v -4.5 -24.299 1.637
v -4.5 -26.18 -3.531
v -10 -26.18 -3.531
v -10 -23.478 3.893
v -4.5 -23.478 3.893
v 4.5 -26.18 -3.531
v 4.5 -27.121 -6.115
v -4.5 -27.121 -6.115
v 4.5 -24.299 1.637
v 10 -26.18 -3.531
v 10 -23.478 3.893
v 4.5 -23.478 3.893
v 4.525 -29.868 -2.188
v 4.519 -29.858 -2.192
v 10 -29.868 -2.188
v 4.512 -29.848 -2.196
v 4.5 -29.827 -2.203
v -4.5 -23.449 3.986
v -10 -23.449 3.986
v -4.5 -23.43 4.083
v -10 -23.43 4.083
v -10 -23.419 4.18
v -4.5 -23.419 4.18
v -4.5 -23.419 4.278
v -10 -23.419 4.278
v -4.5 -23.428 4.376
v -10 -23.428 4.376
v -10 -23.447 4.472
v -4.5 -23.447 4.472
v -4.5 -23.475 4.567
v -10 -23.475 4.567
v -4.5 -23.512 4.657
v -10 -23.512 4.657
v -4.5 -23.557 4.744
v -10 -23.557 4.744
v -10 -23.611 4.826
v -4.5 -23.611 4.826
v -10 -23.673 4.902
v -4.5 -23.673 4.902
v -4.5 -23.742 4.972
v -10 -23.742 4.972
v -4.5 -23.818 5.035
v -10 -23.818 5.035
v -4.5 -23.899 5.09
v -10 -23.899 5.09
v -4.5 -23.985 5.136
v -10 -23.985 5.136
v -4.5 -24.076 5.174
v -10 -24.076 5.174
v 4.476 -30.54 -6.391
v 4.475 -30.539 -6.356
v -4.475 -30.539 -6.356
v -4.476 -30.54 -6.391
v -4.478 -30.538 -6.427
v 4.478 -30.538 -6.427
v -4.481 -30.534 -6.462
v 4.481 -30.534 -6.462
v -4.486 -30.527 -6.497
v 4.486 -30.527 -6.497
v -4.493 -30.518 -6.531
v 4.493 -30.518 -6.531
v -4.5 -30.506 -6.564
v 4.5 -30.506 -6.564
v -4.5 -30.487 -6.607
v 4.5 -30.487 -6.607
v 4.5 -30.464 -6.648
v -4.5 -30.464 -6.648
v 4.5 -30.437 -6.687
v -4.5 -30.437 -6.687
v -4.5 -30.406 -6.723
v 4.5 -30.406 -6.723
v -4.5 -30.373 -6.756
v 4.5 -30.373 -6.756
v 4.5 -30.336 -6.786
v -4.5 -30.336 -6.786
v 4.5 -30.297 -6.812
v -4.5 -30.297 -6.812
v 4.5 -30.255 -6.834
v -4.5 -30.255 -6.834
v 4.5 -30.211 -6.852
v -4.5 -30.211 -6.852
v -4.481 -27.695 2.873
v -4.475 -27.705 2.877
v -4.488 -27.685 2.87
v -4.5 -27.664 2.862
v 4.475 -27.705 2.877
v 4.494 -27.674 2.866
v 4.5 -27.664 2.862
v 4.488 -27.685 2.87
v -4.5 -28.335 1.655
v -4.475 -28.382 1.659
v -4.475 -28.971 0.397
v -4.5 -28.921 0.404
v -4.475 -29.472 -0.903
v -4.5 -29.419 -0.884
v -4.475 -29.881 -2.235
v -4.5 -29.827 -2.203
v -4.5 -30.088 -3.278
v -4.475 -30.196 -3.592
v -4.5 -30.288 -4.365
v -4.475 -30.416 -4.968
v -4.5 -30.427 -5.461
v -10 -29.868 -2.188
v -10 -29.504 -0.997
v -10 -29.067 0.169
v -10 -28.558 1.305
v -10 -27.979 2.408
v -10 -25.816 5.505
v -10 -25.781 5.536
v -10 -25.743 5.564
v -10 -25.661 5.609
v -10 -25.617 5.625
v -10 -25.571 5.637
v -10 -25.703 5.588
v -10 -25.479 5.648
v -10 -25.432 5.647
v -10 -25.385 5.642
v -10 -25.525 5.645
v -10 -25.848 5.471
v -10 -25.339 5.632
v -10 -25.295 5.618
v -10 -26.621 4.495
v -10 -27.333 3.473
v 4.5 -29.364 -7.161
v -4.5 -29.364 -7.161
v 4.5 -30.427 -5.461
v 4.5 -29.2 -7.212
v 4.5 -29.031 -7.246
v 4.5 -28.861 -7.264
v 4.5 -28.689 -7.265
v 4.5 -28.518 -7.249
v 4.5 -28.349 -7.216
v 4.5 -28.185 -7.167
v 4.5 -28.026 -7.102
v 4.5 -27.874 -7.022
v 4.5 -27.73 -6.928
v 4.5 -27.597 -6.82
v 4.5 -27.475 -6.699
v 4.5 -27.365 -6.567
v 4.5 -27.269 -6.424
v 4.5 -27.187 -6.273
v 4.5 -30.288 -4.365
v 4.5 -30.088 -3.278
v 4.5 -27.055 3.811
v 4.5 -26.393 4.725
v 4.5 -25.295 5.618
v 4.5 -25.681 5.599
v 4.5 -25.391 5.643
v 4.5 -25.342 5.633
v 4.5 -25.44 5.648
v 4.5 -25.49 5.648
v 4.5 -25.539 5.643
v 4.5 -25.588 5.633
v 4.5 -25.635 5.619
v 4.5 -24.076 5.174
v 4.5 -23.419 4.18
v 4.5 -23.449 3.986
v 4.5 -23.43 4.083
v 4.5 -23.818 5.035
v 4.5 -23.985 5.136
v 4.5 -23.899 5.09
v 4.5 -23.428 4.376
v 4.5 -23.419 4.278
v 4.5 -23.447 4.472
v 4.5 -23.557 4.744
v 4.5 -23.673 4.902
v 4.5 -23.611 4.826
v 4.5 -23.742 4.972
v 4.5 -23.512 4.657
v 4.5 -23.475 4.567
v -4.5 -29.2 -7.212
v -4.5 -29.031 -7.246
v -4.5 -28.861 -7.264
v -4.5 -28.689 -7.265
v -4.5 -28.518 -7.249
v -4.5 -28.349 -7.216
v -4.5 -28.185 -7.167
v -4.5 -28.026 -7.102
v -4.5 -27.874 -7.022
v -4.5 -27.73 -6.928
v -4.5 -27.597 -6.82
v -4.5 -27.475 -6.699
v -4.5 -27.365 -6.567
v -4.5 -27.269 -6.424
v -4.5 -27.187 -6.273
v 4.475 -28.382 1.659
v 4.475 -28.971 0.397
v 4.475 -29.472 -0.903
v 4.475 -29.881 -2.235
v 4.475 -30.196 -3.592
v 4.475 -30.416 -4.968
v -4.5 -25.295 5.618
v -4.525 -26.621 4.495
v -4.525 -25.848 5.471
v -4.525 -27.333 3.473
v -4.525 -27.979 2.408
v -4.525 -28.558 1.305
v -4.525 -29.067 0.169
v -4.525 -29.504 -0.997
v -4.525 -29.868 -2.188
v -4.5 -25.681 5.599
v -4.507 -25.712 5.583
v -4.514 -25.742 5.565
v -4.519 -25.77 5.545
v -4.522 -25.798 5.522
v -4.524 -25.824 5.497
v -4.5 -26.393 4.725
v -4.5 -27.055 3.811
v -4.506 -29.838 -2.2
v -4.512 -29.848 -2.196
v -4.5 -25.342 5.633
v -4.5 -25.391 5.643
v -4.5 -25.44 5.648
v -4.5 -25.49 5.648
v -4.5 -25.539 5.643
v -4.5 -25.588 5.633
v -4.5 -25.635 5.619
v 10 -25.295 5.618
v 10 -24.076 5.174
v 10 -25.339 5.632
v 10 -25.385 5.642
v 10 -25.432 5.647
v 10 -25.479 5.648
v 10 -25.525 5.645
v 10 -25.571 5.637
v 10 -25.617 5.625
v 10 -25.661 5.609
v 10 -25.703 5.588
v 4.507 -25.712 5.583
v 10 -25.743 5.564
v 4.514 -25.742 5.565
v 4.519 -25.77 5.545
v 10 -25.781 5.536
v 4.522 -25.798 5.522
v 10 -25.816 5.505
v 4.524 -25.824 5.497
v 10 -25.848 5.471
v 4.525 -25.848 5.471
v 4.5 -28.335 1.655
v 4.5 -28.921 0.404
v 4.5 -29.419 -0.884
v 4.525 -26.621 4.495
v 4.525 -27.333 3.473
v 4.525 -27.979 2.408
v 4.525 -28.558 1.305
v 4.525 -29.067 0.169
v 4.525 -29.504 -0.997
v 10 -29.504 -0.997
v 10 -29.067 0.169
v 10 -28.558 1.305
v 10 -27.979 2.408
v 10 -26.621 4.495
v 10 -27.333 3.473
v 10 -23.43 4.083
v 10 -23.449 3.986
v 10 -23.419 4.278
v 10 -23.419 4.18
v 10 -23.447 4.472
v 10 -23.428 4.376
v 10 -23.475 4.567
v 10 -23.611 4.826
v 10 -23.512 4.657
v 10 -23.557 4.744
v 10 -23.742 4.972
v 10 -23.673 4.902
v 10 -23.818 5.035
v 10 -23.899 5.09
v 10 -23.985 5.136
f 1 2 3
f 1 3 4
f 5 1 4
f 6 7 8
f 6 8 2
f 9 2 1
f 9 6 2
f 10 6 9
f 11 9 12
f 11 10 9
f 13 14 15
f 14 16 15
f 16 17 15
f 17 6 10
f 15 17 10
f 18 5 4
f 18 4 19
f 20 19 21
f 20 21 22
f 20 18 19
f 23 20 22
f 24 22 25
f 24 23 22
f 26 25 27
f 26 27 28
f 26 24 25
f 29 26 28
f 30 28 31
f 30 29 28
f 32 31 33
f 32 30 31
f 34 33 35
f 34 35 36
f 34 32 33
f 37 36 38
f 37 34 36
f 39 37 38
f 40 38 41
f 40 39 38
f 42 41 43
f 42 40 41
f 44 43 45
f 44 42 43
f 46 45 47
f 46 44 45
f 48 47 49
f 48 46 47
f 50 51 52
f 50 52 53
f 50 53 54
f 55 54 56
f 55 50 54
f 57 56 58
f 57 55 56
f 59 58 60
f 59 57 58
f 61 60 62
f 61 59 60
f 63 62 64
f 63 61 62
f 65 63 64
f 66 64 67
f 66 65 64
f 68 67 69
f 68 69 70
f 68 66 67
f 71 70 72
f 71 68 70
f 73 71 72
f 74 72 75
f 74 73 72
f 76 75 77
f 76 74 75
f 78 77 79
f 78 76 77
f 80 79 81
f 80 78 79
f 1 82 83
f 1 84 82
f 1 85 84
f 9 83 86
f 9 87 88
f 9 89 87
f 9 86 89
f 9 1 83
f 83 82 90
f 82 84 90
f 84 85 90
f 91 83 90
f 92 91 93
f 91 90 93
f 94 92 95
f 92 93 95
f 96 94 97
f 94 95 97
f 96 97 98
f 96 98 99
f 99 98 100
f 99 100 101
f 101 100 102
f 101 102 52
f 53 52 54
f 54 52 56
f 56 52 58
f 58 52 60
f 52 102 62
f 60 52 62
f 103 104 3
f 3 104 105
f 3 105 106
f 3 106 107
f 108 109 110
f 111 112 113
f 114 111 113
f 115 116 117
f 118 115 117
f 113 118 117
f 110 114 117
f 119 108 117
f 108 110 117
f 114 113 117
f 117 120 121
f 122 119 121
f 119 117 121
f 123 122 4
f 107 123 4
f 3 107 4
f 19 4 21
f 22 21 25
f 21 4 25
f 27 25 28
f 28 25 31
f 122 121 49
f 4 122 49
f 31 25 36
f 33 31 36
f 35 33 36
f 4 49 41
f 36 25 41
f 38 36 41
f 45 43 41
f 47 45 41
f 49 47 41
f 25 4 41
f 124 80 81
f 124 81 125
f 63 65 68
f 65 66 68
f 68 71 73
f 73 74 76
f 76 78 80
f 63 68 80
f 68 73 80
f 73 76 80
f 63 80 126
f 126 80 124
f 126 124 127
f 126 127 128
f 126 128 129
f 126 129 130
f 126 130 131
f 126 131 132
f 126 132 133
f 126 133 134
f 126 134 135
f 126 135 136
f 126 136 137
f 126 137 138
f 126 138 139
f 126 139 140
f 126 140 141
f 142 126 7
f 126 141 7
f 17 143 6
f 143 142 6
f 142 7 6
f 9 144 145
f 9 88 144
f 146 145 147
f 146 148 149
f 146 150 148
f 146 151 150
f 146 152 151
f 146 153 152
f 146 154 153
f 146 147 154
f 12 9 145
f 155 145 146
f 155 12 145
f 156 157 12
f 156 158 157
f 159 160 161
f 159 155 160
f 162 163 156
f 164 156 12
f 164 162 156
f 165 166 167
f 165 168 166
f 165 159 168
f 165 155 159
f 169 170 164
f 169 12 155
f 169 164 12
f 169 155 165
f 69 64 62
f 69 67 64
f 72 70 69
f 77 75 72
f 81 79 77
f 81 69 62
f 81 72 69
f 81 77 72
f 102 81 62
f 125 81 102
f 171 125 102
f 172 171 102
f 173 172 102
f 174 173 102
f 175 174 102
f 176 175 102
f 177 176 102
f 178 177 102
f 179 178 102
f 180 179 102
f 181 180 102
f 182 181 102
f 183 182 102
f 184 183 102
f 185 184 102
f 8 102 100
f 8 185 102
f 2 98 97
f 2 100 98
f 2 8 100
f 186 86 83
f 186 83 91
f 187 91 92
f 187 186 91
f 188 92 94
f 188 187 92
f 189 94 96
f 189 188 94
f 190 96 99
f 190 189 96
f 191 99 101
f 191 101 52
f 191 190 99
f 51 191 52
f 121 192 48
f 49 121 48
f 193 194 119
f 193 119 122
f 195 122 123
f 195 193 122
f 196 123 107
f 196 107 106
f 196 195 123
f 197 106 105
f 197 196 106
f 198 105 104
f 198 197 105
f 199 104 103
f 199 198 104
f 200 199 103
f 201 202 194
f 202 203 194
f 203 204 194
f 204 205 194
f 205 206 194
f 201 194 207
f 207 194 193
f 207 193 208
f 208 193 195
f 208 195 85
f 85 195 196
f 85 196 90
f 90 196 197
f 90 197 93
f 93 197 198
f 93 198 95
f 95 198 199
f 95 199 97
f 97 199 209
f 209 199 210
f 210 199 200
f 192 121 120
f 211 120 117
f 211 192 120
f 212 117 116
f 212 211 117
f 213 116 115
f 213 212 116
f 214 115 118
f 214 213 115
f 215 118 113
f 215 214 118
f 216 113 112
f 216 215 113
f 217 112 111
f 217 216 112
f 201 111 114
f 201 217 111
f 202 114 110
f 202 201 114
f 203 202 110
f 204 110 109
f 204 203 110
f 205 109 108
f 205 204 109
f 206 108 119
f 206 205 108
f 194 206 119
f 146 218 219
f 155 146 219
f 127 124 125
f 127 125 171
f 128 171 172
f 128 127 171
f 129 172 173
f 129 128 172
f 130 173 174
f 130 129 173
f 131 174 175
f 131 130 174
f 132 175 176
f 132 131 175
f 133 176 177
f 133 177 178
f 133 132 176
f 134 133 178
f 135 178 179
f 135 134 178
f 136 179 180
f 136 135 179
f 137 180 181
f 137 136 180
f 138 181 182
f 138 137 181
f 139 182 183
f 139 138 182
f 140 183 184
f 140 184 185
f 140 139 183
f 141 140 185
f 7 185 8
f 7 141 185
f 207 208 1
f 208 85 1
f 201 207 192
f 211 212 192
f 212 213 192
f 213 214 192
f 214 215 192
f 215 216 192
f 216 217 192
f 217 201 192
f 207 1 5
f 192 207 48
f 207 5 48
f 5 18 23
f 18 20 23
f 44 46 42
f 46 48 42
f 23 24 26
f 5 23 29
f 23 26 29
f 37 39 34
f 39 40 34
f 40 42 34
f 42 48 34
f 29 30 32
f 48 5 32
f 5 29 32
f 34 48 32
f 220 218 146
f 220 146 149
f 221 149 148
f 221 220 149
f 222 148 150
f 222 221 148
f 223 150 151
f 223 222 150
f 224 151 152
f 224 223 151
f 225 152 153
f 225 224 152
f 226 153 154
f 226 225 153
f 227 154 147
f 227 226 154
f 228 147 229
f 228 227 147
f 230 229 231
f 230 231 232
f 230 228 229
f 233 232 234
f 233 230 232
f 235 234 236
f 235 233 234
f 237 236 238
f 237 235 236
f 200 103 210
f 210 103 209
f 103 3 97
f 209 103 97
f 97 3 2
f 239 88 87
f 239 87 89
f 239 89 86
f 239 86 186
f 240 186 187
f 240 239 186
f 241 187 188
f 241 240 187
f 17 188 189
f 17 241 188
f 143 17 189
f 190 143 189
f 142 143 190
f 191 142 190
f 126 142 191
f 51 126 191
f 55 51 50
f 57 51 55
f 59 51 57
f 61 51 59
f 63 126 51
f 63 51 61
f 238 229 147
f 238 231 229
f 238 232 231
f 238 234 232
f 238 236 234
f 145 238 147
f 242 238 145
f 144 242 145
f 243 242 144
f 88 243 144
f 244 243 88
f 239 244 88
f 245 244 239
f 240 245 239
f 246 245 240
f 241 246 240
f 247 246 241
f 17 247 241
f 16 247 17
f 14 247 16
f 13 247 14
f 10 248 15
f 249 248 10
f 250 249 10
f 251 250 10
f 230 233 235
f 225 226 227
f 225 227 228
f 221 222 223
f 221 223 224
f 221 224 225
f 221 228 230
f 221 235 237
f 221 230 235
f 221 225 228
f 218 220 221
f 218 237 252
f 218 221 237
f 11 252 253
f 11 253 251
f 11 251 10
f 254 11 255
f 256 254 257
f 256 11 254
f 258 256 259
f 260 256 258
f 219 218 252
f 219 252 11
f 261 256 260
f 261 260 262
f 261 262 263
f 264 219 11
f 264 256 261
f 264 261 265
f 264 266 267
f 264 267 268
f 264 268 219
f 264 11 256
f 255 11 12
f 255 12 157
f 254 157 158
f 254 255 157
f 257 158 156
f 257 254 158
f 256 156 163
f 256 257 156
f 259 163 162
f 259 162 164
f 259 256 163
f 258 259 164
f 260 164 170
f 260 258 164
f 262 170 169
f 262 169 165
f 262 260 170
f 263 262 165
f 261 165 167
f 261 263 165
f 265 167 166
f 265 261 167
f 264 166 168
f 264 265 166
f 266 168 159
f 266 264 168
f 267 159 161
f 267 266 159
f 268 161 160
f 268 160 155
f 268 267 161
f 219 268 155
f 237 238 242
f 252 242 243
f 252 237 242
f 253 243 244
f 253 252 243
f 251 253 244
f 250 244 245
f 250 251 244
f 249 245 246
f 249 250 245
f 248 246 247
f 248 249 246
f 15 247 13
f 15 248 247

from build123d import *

# Parameters (mm, degrees)
PAD013_DEPTH    = 10
SKETCH065_W     = 4.5
SKETCH065_H     = 5.5
SKETCH065_W_2   = 3.4
SKETCH065_H_2   = 9
POCKET012_DEPTH = 7.2375310186


with BuildPart() as part:
    # Sketch064 → Pad013 (new body, symmetric)
    with BuildSketch(Plane.YZ):
        with BuildLine():
            ThreePointArc((-25.8475912574, 5.4708262373), (-29.159051684, -0.0593501339), (-30.5394960729, -6.355618405))
            ThreePointArc((-30.5394960729, -6.355618405), (-30.457390957, -6.658226438), (-30.2112344729, -6.8524424441))
            Line((-30.2112344729, -6.8524424441), (-29.3637121644, -7.1609153372))
            ThreePointArc((-29.3637121644, -7.1609153372), (-28.0255949556, -7.1024918781), (-27.1207148272, -6.1149885016))
            Line((-27.1207148272, -6.1149885016), (-23.4782003008, 3.8927379097))
            ThreePointArc((-23.4782003008, 3.8927379097), (-23.5115851346, 4.6573763148), (-24.0758727783, 5.1744506738))
            Line((-25.2946071344, 5.618033703), (-24.0758727783, 5.1744506738))
            ThreePointArc((-25.2946071344, 5.618033703), (-25.5942405308, 5.6313602812), (-25.8475912574, 5.4708262373))
        make_face()
    extrude(amount=PAD013_DEPTH, both=True)

    # Sketch065 (on Face6 of Pad013) → Pocket012 (cut, through all)
    with BuildSketch(Plane(origin=(0, -21.9828744359, 8.0011119583), x_dir=(0, 0.3420201433, 0.9396926208), z_dir=(0, 0.9396926208, -0.3420201433))):
        with Locations((-14.5220403435, 7.25)):
            Rectangle(SKETCH065_W, SKETCH065_H)
        with Locations((-14.5220403435, -7.25)):
            Rectangle(SKETCH065_W, SKETCH065_H)
        with Locations((-5.0720403435, 0)):
            Rectangle(SKETCH065_W_2, SKETCH065_H_2)
    extrude(amount=-POCKET012_DEPTH, mode=Mode.SUBTRACT)

    # SubtractivePipe003: sweep along a path in Sketch067
    with BuildLine(Plane.YZ.offset(4.5)) as subtractivepipe003_path:
        ThreePointArc((-25.6193920552, 5.7362457467), (-29.1630396012, -0.0694100418), (-30.5561005443, -6.7269214592))
    # Sketch066 (on DatumPlane) → SubtractivePipe003 (sweep, cut)
    with BuildSketch(Plane(origin=(4.5, -30.5394960729, -6.355618405), x_dir=(0, -0.9985433434, 0.0539554573), z_dir=(0, -0.0539554573, -0.9985433434))):
        Polygon((0, -0.025), (0, 0.025), (-0.0433012702, 0), align=None)
    subtractivepipe003 = sweep(path=subtractivepipe003_path.line, mode=Mode.SUBTRACT)

    # Mirrored003: SubtractivePipe003 across YZ
    add(subtractivepipe003.mirror(Plane.YZ), mode=Mode.SUBTRACT)


solid = part.part
